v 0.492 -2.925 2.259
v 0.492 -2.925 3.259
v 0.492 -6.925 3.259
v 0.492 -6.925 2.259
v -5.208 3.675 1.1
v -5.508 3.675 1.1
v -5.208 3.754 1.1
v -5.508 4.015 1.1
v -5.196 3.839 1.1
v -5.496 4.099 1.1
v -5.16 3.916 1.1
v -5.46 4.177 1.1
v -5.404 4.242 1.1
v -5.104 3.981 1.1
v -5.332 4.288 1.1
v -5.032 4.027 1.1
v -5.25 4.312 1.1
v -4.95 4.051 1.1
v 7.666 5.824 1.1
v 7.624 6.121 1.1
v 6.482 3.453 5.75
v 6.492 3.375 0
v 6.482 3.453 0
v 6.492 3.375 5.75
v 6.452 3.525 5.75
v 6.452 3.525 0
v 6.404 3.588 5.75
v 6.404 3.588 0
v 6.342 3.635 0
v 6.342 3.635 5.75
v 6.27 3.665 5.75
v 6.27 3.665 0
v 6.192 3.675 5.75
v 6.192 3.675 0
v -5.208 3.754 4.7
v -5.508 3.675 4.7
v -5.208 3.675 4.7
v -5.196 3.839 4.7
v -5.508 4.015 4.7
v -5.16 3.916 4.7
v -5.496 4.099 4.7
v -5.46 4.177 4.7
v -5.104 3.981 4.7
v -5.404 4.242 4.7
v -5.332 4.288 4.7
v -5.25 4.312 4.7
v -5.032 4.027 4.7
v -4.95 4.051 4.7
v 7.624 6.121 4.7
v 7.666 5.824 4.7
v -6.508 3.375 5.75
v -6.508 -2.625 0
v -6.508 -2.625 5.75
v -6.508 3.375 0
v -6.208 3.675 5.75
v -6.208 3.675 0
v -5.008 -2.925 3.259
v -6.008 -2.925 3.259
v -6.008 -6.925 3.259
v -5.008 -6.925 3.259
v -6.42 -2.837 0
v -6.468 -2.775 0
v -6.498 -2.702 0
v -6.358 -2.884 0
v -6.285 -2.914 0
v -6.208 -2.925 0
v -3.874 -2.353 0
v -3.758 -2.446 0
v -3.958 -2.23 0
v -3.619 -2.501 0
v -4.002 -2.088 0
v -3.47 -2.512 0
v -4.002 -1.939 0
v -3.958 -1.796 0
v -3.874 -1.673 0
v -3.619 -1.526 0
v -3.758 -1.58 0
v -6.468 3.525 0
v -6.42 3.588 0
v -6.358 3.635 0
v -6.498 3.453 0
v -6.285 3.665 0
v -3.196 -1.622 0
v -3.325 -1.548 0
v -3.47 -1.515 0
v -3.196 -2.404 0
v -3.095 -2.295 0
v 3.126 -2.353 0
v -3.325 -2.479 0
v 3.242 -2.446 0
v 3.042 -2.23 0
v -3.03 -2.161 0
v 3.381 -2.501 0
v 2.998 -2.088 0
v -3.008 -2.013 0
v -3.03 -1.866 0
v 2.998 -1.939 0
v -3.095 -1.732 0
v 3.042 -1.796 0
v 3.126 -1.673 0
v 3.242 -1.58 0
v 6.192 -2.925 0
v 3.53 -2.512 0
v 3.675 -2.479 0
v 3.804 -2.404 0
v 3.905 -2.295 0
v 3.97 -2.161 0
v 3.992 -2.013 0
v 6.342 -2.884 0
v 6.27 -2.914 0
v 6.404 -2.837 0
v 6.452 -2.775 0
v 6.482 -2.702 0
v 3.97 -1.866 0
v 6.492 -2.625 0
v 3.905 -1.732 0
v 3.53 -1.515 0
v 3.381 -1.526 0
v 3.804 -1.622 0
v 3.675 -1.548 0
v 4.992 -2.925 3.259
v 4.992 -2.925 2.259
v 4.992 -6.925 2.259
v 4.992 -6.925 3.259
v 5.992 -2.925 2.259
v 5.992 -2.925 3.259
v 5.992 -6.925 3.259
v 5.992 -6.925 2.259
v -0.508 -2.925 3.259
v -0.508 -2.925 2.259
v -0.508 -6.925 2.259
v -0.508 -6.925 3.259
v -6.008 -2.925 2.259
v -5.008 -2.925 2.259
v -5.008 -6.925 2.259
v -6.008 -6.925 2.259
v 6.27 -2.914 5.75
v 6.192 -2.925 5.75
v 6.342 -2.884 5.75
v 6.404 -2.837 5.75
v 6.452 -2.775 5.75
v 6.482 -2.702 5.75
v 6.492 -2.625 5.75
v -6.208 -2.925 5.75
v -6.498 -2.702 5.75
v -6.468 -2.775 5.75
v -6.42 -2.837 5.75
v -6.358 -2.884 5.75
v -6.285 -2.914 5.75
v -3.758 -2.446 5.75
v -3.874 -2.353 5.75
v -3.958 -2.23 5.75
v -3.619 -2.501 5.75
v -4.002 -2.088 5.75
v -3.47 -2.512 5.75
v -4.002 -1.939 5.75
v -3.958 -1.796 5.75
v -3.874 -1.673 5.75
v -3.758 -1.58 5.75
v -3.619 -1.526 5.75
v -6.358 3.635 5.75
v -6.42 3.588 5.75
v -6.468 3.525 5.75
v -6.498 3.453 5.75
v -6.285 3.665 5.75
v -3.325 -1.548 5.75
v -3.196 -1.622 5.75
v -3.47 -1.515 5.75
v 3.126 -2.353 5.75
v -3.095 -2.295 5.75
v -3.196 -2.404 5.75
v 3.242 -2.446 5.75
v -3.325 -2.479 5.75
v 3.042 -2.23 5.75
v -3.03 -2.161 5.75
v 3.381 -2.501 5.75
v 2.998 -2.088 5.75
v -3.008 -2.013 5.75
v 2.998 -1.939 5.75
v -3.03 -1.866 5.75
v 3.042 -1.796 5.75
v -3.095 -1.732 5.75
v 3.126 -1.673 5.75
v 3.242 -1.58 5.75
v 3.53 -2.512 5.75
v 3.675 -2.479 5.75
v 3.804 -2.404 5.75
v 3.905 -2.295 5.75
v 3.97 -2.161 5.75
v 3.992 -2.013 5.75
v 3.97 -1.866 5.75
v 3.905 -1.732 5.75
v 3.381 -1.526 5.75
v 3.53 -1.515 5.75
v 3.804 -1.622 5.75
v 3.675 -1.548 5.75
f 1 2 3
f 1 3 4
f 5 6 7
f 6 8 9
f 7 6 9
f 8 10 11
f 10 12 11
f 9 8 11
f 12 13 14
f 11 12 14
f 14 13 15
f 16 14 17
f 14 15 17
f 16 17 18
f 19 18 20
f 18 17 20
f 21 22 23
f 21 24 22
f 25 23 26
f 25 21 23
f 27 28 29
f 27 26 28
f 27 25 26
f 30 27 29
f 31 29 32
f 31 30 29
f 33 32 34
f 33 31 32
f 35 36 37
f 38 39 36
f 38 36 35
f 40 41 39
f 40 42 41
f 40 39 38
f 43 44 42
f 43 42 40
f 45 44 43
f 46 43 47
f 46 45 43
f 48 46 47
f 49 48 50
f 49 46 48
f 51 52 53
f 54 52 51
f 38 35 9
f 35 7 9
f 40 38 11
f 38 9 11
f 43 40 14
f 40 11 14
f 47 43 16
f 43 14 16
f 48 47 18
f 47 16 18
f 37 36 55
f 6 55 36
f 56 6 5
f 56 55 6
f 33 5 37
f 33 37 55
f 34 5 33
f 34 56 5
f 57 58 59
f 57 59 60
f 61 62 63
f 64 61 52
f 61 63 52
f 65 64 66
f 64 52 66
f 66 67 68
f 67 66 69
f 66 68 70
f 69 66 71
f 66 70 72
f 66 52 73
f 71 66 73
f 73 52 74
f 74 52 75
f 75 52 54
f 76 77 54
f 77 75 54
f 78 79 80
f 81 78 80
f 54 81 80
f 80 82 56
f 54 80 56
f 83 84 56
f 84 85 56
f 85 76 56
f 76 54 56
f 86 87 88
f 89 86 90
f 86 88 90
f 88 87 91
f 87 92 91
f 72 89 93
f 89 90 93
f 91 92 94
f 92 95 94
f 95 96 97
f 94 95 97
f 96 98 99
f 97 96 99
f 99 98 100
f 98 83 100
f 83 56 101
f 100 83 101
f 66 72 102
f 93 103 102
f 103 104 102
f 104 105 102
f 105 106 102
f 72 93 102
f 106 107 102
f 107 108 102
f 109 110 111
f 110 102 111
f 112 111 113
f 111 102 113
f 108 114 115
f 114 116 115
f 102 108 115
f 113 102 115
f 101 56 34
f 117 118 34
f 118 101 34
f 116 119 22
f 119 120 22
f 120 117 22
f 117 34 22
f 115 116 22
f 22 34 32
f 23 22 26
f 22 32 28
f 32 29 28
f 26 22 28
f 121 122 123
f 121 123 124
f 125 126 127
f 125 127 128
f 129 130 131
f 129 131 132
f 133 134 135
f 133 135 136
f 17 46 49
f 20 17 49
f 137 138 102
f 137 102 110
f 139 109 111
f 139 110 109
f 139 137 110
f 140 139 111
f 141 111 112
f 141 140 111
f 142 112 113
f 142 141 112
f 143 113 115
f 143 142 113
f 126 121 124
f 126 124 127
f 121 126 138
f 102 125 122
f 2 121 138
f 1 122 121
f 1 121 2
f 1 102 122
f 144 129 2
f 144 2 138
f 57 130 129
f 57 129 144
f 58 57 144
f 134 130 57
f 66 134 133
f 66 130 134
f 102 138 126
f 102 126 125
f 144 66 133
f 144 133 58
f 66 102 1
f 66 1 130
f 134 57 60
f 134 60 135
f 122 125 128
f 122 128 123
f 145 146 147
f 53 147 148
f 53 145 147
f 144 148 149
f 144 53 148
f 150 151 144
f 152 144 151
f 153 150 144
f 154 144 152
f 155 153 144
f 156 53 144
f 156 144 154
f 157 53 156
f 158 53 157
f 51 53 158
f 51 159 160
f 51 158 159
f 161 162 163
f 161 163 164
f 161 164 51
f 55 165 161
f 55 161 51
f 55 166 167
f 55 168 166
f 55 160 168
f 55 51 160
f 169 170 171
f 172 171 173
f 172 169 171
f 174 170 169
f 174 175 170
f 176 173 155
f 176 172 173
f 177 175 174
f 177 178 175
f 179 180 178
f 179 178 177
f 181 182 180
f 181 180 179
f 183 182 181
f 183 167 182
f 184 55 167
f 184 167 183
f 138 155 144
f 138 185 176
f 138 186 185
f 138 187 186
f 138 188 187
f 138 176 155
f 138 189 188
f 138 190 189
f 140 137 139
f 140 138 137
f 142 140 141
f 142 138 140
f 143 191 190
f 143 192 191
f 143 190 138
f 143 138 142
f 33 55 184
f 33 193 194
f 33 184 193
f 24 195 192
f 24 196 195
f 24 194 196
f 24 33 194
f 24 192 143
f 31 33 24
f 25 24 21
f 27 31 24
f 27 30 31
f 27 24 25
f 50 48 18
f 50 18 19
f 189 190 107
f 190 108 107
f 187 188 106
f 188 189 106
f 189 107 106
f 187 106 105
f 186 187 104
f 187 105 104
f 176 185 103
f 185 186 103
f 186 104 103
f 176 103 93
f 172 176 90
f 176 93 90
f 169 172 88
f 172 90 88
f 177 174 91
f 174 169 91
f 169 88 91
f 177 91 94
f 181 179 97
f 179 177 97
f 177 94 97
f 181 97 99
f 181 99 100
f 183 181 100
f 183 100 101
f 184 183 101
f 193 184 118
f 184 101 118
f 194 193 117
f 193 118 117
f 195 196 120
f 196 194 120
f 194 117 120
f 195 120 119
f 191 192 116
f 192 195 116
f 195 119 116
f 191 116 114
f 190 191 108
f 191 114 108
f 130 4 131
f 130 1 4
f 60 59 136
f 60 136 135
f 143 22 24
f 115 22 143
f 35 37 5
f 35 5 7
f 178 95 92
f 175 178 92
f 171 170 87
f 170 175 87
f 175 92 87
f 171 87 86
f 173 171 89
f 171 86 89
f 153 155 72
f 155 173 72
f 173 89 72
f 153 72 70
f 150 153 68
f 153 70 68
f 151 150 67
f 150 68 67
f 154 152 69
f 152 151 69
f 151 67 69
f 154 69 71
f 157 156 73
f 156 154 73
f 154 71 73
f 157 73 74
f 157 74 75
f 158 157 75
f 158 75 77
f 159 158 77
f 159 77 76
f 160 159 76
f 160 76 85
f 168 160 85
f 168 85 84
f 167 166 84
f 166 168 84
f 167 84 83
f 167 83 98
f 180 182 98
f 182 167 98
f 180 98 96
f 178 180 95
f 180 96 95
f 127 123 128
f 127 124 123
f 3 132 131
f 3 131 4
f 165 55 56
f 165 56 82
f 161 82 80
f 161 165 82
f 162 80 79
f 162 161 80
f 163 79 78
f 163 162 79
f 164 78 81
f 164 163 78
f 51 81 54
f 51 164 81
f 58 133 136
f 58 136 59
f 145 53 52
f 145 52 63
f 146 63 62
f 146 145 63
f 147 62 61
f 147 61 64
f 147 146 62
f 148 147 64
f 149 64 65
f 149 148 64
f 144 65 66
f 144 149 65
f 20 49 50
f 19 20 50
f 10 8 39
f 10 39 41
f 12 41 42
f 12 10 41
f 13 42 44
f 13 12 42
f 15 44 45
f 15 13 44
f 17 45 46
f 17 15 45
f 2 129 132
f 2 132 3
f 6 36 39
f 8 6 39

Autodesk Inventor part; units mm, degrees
ref_plane "YZ Plane" through (0, 0, 0) normal (1, 0, 0) x (0, 1, 0)
ref_plane "XZ Plane" through (0, 0, 0) normal (0, 1, 0) x (-1, 0, 0)
sketch "Sketch1" plane through (0, 0, 0) normal (0, 0, 1) x (1, 0, 0)
  line L0 (-6.5078, 3.6754) -> (6.4922, 3.6754)
  line L1 (6.4922, 3.6754) -> (6.4922, -2.9246)
  line L2 (6.4922, -2.9246) -> (-6.5078, -2.9246)
  line L3 (-6.5078, -2.9246) -> (-6.5078, 3.6754)
  circle A0 centre (-3.5078, -2.0134) radius 0.5
  circle A1 centre (3.4922, -2.0134) radius 0.5
  point P0 (0, 0)
  dimension "d0" = 13
  dimension "d1" = 6.6
  dimension "d2" = 1
  dimension "d3" = 1
  dimension "d4" = 3
  dimension "d5" = 3
extrude "Extrusion1" add sketch "Sketch1" along normal blind 5.75
ref_plane "Work Plane1" through (0, 0, 4.7) normal (0, 0, 1) x (1, 0, 0)
sketch "Sketch2" plane through (0, 0, 4.7) normal (0, 0, 1) x (1, 0, 0)
  circle A0 centre (3.4922, -2.0134) radius 0.5 projected
  circle A1 centre (-3.5078, -2.0134) radius 0.5 projected
  line L0 (6.4922, 3.6754) -> (6.4922, -2.9246) projected
  line L1 (6.4922, -2.9246) -> (-6.5078, -2.9246) projected
  line L2 (-6.5078, -2.9246) -> (-6.5078, 3.6754) projected
  line L3 (-6.5078, 3.6754) -> (6.4922, 3.6754) projected
  line L4 (-5.5078, 3.6754) -> (-5.5078, 4.2754)
  line L5 (-5.2078, 3.6754) -> (-5.2078, 4.0146)
  line L6 (-5.2078, 4.0146) -> (7.6657, 5.8238)
  line L7 (-5.2078, 4.0146) -> (7.7922, 4.0146) construction
  line L8 (-5.5078, 4.2754) -> (7.624, 6.1209)
  line L9 (7.624, 6.1209) -> (7.6657, 5.8238)
  point P0 (0, 0)
  dimension "d9" = 0.6
  dimension "d10" = 0.3
  dimension "d11" = 1
  dimension "d12" = 13
  dimension "d13" = 8
  dimension "d14" = 0.3
extrude "Extrusion2" add sketch "Sketch2" against normal blind 3.6 contours L3 L4 L8 L9 L6 L5
sketch "Sketch3" plane through (-6.5078, -2.9246, 0) normal (0, -1, 0) x (1, 0, 0)
  line L0 (13, 0) -> (0, 0) projected
  line L1 (13, 0) -> (13, 5.75) projected
  line L2 (0, 5.75) -> (13, 5.75) projected
  line L3 (0, 0) -> (0, 5.75) projected
  line L4 (12.5, 2.2589) -> (11.5, 2.2589)
  line L5 (11.5, 2.2589) -> (11.5, 3.2589)
  line L6 (11.5, 3.2589) -> (12.5, 3.2589)
  line L7 (12.5, 3.2589) -> (12.5, 2.2589)
  line L8 (7, 2.2589) -> (6, 2.2589)
  line L9 (6, 2.2589) -> (6, 3.2589)
  line L10 (6, 3.2589) -> (7, 3.2589)
  line L11 (7, 3.2589) -> (7, 2.2589)
  line L12 (1.5, 2.2589) -> (0.5, 2.2589)
  line L13 (0.5, 2.2589) -> (0.5, 3.2589)
  line L14 (0.5, 3.2589) -> (1.5, 3.2589)
  line L15 (1.5, 3.2589) -> (1.5, 2.2589)
  point P0 (6.5078, 0)
  dimension "d17" = 1
  dimension "d18" = 1
  dimension "d19" = 0.5
  dimension "d22" = 5.5
extrude "Extrusion3" add sketch "Sketch3" along normal blind 4 contours L4 L5 L6 L7 | L8 L9 L10 L11 | L12 L13 L14 L15
fillet "Fillet1" radius 0.3 4 edges at (6.4922, 3.6754, 2.875) (6.4922, -2.9246, 2.875) (-6.5078, 3.6754, 2.875) (-6.5078, -2.9246, 2.875)
fillet "Fillet2" radius 0.3 2 edges at (-5.5078, 4.2754, 2.9) (-5.2078, 4.0146, 2.9)
equation "\"d5\" = d4"
equation "\"d14\" = d10"
properties part number "COTS_OMRON_D2FS-FL_Endstop"
